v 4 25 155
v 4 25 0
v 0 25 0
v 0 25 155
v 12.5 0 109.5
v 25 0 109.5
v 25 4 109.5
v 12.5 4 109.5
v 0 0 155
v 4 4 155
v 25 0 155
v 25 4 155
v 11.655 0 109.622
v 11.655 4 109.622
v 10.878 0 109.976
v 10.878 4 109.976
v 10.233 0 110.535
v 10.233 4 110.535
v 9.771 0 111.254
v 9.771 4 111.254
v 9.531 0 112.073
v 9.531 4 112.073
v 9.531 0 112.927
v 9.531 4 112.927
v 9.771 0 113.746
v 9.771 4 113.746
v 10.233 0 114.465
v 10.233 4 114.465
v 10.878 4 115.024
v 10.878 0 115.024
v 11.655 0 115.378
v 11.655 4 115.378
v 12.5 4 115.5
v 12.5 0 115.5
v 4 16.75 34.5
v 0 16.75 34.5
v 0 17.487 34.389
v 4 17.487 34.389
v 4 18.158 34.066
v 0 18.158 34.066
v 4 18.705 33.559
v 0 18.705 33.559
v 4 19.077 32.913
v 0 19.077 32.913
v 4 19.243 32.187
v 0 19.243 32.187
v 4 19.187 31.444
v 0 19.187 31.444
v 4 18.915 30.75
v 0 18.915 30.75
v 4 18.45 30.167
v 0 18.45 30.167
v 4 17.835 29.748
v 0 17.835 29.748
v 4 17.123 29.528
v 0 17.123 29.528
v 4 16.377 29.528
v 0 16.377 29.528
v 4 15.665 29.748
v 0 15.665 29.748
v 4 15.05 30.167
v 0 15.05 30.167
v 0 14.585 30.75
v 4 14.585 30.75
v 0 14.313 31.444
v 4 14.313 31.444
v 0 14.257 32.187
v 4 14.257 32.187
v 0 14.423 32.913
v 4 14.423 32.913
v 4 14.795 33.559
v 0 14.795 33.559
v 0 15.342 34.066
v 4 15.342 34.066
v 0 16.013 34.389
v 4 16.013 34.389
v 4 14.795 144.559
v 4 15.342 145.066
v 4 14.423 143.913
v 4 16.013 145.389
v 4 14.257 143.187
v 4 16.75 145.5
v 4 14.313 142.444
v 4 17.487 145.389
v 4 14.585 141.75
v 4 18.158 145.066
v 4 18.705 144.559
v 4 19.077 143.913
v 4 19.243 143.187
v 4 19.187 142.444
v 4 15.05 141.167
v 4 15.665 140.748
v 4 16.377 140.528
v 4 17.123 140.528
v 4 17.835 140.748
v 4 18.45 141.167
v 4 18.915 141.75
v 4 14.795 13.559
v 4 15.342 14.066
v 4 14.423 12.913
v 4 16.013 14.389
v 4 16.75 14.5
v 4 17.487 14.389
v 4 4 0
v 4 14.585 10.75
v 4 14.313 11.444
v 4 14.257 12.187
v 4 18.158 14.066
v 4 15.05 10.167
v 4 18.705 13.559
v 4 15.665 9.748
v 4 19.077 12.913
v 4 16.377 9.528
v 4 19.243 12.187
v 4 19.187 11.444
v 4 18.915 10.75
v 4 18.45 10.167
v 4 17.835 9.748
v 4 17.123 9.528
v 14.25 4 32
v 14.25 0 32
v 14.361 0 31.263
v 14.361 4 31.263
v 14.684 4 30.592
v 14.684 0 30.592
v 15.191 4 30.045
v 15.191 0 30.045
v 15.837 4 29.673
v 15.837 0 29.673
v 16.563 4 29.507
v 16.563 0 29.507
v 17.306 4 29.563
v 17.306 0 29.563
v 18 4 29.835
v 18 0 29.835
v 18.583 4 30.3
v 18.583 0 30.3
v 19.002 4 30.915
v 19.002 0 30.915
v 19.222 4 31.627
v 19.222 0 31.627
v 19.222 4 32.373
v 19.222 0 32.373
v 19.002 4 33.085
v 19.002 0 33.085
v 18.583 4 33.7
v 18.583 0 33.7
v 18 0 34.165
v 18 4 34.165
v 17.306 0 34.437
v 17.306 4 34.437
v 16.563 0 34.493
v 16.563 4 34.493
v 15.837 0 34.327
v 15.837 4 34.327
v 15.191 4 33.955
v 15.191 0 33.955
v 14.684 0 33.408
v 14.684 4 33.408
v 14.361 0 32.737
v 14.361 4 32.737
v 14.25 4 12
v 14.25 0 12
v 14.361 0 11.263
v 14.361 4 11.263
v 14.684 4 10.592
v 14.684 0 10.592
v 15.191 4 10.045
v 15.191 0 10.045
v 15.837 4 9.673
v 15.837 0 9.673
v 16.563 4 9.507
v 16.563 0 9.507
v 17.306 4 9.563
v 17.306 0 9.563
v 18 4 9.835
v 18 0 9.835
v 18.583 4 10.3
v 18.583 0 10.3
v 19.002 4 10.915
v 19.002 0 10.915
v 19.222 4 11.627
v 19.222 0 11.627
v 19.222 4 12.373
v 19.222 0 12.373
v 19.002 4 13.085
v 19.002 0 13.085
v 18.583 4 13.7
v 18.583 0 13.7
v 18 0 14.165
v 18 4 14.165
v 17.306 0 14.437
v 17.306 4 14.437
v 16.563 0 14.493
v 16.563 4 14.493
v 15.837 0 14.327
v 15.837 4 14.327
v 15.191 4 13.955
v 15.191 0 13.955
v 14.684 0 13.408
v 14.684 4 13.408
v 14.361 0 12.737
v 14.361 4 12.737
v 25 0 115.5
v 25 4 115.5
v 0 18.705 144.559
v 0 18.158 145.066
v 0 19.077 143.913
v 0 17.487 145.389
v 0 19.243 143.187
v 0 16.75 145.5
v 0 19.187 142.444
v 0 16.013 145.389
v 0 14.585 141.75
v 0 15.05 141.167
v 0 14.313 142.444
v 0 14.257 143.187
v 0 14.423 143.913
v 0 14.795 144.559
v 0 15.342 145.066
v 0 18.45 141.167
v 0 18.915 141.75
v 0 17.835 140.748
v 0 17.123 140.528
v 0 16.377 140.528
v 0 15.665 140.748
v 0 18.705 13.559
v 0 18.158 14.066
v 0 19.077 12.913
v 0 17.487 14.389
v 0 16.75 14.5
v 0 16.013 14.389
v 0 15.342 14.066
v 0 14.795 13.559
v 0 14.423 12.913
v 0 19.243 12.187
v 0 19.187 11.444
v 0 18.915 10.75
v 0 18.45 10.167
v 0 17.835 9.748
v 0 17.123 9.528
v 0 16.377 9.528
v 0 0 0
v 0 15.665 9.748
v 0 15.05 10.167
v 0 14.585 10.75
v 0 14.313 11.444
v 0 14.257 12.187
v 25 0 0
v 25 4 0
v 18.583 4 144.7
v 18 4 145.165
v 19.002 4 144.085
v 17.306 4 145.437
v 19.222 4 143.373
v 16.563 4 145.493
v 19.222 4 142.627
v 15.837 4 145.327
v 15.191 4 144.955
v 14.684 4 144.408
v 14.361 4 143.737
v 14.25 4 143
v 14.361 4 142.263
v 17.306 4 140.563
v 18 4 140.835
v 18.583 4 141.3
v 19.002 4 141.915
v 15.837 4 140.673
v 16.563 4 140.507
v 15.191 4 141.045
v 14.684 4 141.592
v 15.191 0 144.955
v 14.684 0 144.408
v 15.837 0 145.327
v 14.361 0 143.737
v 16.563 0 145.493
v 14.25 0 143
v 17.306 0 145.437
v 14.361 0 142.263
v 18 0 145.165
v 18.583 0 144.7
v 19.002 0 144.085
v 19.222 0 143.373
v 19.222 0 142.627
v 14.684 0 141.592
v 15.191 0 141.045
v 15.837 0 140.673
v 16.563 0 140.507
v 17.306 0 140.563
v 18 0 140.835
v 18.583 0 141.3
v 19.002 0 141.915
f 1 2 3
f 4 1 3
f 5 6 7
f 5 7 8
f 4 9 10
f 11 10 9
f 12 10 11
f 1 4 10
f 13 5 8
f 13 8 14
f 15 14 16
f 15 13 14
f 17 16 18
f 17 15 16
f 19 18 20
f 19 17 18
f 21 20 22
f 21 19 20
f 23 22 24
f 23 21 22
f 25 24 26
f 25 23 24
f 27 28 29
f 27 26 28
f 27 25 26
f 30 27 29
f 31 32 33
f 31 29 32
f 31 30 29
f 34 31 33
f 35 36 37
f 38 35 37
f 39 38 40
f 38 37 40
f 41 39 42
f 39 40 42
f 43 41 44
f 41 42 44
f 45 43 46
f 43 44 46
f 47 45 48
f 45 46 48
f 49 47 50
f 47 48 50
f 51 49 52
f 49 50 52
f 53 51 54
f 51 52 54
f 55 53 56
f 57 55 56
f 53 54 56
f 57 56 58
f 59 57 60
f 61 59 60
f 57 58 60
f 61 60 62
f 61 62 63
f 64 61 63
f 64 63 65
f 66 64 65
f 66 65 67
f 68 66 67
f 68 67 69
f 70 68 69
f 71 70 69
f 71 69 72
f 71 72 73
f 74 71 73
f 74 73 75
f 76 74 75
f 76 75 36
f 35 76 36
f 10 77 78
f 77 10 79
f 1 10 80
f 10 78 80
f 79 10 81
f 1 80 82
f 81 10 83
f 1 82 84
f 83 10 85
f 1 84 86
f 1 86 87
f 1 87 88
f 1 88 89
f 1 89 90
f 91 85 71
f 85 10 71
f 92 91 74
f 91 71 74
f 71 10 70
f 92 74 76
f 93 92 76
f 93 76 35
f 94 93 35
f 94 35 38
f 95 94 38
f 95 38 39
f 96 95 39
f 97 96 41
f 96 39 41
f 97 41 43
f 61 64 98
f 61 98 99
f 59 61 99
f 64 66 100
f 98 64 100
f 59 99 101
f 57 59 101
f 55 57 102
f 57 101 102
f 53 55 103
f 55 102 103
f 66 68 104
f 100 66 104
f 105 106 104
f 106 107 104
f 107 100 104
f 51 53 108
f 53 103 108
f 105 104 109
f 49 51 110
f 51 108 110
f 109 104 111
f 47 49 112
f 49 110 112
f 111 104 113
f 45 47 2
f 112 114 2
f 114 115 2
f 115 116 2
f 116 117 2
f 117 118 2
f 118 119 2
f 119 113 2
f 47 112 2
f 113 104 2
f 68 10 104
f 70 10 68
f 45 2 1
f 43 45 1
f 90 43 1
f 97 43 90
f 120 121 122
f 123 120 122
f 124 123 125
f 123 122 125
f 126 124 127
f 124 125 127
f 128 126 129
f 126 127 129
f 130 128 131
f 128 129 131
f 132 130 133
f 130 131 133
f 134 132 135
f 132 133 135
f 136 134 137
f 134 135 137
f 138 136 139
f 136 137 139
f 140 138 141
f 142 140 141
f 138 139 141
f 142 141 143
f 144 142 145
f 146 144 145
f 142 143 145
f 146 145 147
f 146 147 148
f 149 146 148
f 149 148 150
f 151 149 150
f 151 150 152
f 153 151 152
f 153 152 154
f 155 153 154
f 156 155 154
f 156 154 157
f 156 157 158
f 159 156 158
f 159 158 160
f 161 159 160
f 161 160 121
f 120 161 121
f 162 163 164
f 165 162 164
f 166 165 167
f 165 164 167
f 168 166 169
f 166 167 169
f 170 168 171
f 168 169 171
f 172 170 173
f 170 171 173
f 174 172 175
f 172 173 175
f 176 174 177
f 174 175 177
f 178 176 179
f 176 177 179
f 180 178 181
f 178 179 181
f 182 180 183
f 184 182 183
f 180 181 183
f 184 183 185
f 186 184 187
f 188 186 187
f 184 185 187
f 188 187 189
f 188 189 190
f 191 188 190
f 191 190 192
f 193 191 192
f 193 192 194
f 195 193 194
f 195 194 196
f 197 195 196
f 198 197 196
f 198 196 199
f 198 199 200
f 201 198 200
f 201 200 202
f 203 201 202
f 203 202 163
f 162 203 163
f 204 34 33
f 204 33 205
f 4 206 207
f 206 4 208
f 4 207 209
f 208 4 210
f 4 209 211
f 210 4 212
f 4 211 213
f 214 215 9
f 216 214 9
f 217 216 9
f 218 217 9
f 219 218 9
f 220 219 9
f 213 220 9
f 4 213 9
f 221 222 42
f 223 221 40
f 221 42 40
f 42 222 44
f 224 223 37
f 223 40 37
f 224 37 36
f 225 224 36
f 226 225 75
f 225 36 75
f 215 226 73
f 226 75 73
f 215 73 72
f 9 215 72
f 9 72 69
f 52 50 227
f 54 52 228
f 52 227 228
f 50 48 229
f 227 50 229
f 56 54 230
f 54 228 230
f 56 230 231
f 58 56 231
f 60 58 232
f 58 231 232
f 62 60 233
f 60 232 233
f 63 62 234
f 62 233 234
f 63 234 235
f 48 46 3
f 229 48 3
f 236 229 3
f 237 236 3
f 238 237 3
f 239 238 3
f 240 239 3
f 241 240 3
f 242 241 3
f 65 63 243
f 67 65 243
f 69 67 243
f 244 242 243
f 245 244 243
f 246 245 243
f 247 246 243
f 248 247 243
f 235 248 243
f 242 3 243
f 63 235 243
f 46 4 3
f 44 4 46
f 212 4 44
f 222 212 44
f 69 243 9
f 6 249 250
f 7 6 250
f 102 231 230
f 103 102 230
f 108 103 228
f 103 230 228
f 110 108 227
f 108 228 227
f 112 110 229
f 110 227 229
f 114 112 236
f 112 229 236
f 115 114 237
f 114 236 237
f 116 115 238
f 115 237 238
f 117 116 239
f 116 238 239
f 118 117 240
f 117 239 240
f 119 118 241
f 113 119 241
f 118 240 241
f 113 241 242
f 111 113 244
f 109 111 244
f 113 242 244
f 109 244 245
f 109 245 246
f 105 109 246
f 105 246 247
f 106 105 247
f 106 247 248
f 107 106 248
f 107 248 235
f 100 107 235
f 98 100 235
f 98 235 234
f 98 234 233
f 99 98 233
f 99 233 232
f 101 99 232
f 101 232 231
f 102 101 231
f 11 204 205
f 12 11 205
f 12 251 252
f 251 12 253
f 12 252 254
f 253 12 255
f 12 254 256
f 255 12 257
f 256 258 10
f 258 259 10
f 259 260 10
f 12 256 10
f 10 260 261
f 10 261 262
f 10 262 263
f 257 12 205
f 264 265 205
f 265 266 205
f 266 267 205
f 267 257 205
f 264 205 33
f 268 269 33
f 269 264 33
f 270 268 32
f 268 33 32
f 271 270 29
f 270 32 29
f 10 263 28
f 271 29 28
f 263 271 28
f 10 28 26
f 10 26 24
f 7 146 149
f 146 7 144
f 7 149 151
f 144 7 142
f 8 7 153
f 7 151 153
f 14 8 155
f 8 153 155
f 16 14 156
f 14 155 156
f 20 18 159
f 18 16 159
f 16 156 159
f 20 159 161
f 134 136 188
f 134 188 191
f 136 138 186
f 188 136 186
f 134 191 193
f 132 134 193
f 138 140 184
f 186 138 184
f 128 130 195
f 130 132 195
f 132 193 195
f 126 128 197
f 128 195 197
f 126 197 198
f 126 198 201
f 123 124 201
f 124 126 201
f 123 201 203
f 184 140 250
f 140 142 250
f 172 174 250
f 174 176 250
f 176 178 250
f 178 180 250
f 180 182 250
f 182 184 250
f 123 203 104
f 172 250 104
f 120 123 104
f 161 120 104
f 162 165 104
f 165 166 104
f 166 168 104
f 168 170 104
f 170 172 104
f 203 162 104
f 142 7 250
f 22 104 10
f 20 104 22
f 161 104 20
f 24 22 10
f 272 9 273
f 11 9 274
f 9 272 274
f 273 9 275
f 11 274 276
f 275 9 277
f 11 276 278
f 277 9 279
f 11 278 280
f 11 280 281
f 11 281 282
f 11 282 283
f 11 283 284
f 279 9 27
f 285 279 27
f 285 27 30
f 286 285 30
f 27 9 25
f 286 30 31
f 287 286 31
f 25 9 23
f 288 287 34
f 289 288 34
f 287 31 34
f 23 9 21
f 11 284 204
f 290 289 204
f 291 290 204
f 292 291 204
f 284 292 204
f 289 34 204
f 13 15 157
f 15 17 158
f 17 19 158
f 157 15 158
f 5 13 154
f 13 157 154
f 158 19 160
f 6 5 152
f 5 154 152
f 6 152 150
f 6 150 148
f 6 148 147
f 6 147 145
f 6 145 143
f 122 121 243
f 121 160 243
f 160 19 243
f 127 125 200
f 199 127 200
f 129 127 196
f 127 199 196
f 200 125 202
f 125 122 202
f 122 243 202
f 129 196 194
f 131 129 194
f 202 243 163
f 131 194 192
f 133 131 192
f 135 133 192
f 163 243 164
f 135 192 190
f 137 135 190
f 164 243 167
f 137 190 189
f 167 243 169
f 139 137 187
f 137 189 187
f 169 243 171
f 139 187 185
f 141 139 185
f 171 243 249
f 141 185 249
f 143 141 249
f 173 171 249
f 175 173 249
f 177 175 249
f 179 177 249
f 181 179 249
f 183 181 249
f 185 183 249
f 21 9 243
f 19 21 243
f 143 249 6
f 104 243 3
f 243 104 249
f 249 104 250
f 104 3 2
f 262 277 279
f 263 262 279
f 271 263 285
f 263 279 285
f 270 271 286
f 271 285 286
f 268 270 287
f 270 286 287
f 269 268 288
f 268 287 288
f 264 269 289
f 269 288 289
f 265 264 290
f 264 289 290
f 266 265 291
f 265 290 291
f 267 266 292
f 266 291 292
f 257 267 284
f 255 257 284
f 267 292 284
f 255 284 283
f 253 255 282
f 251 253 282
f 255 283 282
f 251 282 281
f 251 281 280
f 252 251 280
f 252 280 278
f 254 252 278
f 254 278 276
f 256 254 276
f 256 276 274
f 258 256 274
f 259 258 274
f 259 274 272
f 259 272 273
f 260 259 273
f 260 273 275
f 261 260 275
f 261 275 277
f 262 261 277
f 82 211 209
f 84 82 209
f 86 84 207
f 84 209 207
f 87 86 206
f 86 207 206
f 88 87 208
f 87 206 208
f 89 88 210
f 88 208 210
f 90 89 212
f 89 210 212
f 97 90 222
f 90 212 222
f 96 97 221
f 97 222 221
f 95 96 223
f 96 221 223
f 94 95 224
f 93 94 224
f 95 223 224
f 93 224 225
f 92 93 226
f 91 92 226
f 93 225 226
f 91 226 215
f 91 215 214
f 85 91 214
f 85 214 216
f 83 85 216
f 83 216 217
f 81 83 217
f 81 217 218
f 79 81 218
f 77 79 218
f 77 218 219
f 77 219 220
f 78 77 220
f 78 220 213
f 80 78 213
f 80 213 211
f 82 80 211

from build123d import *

# Parameters (mm, degrees)
EXTRUDE_1_DEPTH     = 155
HOLE_WIZARD_M6_1_D  = 5
HOLE_WIZARD_M6_2_D  = 5
CUT_EXTRUDE_1_DEPTH = 159.981130956


with BuildPart() as part:
    # 草图1 → 凸台-拉伸1 (new body)
    with BuildSketch(Plane.XY):
        Polygon((0, 25), (0, 0), (25, 0), (25, 4), (4, 4), (4, 25), align=None)
    extrude(amount=EXTRUDE_1_DEPTH)

    # M6 螺纹孔1 (through all)
    with Locations(Plane(origin=(0, 4, 0), x_dir=(1, 0, 0), z_dir=(0, 1, 0))):
        with Locations((16.75, -12), (16.75, -143), (16.75, -32)):
            Hole(HOLE_WIZARD_M6_1_D / 2)

    # M6 螺纹孔2 (through all)
    with Locations(Plane(origin=(4, 0, 0), x_dir=(0, 0, -1), z_dir=(1, 0, 0))):
        with Locations((-143, 16.75), (-12, 16.75), (-32, 16.75)):
            Hole(HOLE_WIZARD_M6_2_D / 2)

    # 草图6 → 切除-拉伸1 (cut, through all)
    with BuildSketch(Plane.XZ):
        with BuildLine():
            Line((25, 109.5), (12.5, 109.5))
            ThreePointArc((12.5, 109.5), (9.5, 112.5), (12.5, 115.5))
            Line((12.5, 115.5), (25, 115.5))
            ThreePointArc((25, 115.5), (28, 112.5), (25, 109.5))
        make_face()
    extrude(amount=-CUT_EXTRUDE_1_DEPTH, mode=Mode.SUBTRACT)


solid = part.part
